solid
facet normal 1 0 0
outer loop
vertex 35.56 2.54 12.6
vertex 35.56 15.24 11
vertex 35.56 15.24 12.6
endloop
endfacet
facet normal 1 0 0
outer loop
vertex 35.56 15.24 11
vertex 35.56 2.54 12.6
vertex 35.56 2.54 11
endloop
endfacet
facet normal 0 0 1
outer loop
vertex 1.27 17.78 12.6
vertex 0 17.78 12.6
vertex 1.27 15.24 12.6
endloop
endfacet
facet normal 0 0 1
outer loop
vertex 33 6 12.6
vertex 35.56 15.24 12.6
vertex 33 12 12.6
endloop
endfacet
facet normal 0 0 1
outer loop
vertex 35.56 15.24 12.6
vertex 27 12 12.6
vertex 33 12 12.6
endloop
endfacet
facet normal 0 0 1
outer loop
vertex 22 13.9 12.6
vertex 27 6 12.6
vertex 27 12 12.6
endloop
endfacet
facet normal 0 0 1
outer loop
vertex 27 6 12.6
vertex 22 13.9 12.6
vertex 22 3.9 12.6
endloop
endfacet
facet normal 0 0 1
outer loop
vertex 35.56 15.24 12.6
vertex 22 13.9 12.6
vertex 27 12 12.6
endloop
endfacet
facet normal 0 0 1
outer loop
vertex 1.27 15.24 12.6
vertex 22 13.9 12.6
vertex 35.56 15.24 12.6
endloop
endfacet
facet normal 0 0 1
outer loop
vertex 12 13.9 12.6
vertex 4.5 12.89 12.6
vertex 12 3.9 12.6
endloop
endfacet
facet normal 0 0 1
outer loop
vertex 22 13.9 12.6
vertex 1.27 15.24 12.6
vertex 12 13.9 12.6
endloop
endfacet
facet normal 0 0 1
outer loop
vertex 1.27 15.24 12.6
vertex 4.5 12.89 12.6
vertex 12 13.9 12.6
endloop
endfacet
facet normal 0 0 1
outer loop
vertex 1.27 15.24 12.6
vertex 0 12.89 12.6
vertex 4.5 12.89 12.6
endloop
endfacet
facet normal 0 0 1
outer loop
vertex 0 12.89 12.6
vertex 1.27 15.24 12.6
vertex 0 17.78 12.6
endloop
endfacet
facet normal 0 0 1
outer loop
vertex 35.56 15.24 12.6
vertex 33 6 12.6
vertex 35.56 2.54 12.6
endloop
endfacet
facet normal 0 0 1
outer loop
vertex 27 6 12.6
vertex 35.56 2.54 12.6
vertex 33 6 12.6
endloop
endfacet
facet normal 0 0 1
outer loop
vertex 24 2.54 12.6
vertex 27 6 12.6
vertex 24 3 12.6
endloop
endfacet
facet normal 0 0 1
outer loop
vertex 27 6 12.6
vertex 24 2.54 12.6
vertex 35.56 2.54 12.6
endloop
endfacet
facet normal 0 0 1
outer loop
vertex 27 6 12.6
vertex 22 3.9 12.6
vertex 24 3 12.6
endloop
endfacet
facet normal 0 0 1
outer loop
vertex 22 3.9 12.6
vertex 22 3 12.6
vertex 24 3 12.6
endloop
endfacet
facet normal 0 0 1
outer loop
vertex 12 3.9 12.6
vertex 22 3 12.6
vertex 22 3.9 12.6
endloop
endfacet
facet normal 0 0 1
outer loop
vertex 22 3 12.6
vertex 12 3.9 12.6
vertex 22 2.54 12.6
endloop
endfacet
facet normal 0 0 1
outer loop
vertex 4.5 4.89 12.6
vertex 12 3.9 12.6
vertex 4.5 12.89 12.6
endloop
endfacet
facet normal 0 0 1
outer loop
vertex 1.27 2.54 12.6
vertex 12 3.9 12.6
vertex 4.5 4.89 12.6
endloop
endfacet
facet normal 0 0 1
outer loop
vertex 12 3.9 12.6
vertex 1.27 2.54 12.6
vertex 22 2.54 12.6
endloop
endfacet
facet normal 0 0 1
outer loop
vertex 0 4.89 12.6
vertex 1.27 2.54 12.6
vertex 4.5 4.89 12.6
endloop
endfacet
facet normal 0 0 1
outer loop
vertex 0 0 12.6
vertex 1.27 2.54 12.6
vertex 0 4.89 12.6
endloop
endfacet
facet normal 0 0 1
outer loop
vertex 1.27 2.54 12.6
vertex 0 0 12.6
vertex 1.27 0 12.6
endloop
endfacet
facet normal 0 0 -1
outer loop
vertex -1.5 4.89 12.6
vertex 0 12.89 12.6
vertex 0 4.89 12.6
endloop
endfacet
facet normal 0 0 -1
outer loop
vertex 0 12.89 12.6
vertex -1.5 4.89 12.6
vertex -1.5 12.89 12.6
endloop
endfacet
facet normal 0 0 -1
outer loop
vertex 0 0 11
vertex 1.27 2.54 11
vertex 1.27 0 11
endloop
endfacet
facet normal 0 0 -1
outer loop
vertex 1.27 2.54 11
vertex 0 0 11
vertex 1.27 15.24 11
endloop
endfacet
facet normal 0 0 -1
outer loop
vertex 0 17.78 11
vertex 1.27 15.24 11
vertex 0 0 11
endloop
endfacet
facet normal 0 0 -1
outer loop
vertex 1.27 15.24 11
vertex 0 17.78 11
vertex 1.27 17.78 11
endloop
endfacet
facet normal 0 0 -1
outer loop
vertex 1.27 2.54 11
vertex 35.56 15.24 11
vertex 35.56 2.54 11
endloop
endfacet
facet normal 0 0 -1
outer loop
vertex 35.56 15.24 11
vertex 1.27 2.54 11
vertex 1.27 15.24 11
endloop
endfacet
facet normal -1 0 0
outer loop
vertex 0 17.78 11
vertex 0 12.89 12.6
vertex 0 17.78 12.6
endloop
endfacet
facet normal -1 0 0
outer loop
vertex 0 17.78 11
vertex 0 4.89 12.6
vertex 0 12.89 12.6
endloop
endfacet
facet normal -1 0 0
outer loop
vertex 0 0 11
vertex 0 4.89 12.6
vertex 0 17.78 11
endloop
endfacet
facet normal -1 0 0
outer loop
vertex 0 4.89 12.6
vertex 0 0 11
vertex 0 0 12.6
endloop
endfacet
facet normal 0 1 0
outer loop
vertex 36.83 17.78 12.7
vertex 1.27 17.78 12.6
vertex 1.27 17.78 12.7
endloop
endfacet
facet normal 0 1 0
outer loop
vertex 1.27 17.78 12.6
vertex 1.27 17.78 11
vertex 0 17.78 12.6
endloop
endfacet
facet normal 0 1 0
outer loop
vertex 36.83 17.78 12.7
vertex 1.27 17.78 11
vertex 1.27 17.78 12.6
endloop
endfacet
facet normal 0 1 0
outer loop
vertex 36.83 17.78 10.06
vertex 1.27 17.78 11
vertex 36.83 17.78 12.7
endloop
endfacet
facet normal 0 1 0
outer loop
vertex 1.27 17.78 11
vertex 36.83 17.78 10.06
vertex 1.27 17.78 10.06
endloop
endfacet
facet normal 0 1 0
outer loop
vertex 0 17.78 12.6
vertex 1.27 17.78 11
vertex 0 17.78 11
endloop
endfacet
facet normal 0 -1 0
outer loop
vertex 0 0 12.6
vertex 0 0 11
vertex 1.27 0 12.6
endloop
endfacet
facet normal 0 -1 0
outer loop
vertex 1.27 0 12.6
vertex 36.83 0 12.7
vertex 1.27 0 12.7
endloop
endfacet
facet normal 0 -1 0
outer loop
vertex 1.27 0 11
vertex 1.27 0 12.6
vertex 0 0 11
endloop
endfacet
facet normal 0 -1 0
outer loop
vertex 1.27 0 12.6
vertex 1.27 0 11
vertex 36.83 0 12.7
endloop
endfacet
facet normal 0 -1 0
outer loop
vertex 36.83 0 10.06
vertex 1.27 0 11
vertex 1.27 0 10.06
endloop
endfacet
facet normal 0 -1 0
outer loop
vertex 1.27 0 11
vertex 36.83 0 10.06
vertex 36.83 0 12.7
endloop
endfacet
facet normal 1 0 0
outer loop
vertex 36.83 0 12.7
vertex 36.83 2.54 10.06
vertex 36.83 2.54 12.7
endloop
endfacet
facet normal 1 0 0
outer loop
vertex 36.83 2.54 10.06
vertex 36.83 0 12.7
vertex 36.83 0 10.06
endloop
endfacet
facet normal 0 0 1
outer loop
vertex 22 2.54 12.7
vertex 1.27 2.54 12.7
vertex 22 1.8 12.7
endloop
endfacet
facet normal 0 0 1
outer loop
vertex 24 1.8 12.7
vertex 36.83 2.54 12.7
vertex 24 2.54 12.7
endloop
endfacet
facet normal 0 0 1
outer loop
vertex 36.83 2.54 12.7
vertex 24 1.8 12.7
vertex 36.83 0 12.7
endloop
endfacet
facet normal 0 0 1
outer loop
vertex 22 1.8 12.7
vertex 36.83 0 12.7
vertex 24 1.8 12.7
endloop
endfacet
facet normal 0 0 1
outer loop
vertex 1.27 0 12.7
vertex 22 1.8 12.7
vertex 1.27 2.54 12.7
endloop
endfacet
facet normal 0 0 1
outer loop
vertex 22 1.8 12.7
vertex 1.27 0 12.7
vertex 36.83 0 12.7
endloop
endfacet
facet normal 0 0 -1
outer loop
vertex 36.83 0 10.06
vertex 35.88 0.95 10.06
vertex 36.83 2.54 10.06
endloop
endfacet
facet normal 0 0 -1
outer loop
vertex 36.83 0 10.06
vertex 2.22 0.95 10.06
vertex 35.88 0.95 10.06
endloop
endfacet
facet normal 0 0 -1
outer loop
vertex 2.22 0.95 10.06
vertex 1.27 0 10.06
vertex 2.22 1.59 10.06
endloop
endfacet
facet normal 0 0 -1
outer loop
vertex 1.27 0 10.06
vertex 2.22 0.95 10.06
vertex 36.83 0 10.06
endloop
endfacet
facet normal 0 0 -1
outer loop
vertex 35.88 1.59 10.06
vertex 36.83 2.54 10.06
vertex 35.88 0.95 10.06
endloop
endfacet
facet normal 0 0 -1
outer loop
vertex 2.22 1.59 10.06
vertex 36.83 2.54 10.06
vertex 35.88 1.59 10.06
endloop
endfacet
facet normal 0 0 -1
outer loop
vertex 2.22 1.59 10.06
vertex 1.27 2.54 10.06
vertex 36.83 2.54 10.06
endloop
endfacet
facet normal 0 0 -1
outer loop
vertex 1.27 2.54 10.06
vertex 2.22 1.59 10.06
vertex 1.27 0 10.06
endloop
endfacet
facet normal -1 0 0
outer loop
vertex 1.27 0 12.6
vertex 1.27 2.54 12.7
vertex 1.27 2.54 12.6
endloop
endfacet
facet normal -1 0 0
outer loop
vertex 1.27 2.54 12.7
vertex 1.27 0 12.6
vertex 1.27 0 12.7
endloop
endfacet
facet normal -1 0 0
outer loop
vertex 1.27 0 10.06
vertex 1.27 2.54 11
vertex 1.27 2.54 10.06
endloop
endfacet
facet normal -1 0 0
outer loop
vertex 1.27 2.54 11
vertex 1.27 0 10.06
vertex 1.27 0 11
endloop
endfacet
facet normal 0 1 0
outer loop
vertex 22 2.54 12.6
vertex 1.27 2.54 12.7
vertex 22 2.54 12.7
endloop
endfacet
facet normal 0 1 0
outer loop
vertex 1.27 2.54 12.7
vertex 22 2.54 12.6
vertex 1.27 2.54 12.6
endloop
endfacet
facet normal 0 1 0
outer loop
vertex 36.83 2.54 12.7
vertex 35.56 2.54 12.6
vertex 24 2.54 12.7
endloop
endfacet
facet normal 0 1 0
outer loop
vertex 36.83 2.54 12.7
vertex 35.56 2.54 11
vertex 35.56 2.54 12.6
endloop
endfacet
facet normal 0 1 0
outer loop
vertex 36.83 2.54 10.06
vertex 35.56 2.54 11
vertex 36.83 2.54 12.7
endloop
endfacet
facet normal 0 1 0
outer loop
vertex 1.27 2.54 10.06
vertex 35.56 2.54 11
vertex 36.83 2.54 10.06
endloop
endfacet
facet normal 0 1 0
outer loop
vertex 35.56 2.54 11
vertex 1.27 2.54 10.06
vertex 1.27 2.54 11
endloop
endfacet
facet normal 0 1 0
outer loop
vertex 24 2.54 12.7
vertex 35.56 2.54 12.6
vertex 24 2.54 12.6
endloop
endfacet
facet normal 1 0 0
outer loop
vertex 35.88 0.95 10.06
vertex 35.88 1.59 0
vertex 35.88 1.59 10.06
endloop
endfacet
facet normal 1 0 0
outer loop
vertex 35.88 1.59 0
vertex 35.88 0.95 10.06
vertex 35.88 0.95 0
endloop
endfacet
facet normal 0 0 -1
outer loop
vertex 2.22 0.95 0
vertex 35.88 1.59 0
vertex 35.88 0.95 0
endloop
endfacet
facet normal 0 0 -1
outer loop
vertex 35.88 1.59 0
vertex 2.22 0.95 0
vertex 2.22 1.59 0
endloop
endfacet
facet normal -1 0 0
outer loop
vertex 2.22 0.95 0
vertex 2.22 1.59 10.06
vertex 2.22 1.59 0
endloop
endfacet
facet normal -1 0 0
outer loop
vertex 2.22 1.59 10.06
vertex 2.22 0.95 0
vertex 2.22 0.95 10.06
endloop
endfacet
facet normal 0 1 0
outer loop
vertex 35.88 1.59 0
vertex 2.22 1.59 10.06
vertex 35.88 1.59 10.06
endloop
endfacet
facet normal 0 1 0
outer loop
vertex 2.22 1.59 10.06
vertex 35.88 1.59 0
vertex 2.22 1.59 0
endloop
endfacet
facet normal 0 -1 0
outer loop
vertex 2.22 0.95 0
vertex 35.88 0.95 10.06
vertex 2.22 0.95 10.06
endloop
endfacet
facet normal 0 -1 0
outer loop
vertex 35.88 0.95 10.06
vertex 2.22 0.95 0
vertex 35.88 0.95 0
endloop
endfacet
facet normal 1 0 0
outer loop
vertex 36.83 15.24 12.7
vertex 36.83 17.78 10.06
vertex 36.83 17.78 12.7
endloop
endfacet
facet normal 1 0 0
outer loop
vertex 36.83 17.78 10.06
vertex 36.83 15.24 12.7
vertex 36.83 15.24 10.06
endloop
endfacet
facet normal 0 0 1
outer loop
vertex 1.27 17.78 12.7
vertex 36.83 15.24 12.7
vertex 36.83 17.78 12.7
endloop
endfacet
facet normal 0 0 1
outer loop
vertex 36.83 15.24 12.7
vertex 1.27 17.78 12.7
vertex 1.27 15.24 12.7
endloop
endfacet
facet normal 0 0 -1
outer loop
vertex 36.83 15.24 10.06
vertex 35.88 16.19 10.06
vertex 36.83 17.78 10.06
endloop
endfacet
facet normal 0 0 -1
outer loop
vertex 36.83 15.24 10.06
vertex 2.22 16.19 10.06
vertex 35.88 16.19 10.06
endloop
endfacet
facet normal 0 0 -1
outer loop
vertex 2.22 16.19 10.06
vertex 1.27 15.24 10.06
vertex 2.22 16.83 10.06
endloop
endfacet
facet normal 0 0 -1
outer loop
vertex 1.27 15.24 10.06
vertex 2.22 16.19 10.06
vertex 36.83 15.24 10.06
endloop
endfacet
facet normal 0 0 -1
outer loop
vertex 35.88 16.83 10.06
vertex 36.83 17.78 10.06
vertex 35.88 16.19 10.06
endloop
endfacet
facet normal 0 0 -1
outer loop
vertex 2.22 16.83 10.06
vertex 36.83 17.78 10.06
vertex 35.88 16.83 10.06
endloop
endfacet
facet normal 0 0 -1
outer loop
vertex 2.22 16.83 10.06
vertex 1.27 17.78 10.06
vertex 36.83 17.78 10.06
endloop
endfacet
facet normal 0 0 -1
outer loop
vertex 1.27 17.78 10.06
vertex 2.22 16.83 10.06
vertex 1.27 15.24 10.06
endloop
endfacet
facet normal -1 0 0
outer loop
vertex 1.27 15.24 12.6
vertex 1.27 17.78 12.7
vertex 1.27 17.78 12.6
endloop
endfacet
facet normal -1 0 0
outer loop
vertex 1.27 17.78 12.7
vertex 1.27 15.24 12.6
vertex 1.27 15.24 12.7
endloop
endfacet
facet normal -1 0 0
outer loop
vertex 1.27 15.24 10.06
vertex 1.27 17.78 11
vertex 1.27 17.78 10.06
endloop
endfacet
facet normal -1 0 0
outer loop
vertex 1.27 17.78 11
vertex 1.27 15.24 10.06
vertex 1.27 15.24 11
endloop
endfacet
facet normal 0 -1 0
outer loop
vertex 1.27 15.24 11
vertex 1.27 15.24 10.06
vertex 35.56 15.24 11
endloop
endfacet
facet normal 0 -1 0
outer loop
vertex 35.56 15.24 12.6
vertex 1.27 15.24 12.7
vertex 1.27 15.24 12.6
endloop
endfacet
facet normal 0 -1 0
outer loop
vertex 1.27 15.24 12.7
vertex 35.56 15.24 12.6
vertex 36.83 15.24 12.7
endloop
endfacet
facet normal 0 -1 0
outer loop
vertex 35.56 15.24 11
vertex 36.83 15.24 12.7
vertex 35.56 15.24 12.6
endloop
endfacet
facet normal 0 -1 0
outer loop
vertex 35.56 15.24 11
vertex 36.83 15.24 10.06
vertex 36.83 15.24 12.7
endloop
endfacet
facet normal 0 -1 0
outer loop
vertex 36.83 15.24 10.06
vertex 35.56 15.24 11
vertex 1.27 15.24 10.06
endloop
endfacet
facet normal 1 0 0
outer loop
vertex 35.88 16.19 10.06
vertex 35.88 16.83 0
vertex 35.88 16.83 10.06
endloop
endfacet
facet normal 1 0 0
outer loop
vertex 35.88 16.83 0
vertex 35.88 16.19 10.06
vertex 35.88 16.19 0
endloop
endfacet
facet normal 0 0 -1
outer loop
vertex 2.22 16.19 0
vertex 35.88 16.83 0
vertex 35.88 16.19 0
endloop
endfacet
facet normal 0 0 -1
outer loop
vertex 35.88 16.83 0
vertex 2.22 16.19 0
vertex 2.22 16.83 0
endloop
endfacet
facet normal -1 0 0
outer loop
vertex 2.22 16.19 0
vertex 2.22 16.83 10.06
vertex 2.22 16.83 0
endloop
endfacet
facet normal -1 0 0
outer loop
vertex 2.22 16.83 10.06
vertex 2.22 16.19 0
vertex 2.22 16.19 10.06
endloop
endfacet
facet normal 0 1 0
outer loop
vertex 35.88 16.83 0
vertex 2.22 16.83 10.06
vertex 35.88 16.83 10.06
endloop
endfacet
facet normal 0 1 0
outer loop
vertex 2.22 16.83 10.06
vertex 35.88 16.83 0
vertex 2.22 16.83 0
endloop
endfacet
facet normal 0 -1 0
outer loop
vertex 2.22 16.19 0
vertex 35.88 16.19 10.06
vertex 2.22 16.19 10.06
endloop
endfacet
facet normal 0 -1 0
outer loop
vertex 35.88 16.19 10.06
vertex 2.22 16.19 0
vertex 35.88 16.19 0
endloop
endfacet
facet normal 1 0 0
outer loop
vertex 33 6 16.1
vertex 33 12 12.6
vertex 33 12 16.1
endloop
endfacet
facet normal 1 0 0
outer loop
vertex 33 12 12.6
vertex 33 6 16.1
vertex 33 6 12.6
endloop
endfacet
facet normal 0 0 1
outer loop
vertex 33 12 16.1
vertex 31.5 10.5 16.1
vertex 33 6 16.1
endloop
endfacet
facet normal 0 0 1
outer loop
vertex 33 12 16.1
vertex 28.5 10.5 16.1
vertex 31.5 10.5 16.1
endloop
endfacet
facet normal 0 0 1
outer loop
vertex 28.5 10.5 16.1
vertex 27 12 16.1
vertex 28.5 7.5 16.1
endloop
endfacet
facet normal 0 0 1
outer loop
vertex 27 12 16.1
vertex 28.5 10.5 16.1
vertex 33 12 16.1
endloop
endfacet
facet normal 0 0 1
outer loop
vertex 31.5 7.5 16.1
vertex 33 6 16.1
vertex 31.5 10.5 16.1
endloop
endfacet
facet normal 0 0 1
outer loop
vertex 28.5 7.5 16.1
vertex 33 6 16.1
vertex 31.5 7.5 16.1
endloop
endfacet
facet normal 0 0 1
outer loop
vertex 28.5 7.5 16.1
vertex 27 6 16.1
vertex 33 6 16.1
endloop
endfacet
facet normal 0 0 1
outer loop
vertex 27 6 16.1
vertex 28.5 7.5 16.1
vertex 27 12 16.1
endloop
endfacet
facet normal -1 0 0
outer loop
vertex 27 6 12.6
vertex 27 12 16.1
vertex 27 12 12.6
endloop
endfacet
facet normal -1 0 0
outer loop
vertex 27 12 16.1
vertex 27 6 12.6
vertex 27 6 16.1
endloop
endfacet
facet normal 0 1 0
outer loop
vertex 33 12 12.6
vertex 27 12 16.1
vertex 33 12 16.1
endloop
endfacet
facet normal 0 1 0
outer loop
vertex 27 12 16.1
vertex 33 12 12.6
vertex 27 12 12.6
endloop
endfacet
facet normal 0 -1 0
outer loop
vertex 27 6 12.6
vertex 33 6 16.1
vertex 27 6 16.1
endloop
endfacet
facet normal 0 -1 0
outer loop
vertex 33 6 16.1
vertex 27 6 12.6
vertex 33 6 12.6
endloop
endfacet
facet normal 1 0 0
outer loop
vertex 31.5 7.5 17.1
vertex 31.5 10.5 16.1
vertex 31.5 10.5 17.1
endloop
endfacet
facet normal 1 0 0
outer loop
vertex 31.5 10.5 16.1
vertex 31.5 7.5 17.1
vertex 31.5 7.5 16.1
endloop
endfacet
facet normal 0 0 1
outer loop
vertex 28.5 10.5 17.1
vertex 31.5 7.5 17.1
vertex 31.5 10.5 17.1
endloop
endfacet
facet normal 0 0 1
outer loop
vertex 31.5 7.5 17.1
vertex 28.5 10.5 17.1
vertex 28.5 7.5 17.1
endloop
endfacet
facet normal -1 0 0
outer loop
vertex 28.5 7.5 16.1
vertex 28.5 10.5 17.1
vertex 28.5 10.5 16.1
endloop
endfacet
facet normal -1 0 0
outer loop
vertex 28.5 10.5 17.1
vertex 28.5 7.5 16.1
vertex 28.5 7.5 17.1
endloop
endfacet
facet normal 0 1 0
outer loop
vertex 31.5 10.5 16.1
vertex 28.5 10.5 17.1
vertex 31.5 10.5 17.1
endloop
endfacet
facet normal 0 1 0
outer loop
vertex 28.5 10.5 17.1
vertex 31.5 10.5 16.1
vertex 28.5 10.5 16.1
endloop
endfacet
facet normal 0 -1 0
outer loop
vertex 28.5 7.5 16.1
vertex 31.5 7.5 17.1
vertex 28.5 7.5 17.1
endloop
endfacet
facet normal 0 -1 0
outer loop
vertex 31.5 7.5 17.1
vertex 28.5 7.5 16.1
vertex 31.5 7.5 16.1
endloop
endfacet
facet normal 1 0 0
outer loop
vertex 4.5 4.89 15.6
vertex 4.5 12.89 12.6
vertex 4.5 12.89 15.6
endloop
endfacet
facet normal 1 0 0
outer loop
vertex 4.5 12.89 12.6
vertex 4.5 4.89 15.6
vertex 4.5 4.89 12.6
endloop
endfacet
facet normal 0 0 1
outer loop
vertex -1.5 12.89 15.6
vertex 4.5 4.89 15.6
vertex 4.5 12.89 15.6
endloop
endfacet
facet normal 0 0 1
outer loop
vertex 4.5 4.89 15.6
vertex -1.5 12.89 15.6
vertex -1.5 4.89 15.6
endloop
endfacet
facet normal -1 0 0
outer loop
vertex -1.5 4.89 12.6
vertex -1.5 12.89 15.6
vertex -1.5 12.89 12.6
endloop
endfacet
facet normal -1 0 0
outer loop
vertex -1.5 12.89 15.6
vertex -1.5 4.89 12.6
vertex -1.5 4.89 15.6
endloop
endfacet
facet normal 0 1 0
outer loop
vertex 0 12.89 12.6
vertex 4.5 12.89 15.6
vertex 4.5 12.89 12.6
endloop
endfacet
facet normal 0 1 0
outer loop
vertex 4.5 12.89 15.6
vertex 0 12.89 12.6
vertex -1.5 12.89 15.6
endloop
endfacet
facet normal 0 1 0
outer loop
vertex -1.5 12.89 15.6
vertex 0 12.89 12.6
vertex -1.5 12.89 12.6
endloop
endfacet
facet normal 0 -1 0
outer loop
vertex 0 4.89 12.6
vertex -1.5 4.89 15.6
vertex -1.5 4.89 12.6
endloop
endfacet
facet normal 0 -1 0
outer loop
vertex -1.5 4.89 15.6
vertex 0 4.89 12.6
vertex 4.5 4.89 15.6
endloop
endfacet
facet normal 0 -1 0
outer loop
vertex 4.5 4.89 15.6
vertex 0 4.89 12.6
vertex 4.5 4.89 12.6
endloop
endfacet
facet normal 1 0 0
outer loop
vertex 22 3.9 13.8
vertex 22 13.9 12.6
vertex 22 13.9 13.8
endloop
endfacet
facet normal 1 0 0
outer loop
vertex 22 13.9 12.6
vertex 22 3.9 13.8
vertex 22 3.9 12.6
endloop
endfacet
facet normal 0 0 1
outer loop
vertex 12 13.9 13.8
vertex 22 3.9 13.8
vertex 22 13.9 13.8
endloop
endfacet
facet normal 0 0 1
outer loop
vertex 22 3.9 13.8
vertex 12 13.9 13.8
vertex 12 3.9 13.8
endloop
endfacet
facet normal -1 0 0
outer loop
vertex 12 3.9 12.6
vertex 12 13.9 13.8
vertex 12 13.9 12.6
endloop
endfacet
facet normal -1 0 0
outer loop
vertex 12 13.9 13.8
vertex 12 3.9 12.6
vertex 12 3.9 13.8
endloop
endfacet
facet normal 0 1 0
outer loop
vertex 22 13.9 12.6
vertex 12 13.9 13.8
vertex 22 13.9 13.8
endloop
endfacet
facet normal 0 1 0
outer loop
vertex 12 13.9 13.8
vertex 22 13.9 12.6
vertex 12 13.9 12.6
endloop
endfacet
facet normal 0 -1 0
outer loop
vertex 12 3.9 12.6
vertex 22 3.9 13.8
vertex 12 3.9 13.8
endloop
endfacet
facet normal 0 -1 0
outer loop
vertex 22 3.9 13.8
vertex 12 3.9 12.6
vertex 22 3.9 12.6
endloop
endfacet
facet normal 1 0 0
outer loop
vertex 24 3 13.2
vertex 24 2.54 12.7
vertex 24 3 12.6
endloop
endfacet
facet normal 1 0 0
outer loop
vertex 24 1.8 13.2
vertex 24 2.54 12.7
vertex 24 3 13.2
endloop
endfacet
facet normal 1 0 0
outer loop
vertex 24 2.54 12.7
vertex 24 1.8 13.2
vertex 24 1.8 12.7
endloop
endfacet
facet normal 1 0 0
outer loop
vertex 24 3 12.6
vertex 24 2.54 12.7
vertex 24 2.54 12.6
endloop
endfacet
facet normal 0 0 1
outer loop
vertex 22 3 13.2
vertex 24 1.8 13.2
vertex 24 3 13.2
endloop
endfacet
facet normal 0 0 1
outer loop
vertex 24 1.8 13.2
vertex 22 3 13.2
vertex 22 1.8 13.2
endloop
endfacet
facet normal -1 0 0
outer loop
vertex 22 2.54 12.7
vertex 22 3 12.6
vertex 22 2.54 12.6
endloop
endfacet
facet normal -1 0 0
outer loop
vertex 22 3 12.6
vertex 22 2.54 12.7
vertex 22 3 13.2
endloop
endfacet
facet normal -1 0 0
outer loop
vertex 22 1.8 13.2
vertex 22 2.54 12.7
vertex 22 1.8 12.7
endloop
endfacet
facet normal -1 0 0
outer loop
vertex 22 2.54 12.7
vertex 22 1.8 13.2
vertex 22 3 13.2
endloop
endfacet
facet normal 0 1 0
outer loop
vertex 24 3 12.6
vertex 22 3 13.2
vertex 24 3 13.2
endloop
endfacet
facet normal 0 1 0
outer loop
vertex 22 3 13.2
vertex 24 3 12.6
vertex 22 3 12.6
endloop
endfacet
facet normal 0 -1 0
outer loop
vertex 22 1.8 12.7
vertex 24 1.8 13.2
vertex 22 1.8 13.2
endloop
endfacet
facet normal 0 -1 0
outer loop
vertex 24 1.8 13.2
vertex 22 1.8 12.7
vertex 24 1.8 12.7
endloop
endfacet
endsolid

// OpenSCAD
// file: ../board_common.scad
// What every board model here is made of: a PCB with holes, pin headers,
// chips and jacks, drawn from published dimensions. Nothing here is anyone's
// mesh; a board's outline, hole positions and connector placements are
// specifications the makers publish so that cases and shields can be made.
//
// Every board's origin is its PCB's front-left bottom corner (x right, y back,
// z up), with the PCB lying flat on z = 0 -- so a board placed at a node in
// a site sits on that node's floor, which is where a board sits on a bench.

pcb_t = 1.6;
pitch = 2.54;

module pcb(size, holes = [], hole_d = 3.2, col = "darkgreen") {
    color(col) difference() {
        cube([size.x, size.y, pcb_t]);
        for (h = holes) translate([h.x, h.y, -1]) cylinder(d = hole_d, h = pcb_t + 2, $fn = 16);
    }
}

// Pins are square posts that overlap what they stand in. OpenSCAD 2021.01
// exports a union with hexagonal pins, or with parts that only touch along
// an edge, as a mesh that is not closed -- and then drops it from any later
// union, silently. Every part here overlaps its neighbour by a little.
pin = 0.64;

// a row of `n` pins at the given start, along +x (or +y when `along_y`), with plastic bodies
module header(n, at, along_y = false, rows = 1, h = 8.5) {
    translate([at.x, at.y, pcb_t - 0.1]) rotate([0, 0, along_y ? 90 : 0]) translate([0, along_y ? -rows * pitch : 0, 0]) {
        color("black") cube([n * pitch, rows * pitch, h]);
        color("gold") for (i = [0 : n - 1]) for (r = [0 : rows - 1])
            translate([i * pitch + pitch / 2 - pin / 2, r * pitch + pitch / 2 - pin / 2, -3]) cube([pin, pin, h + 6]);
    }
}

// a row of `n` bare pins pointing down (a devkit standing on a breadboard).
// The pins are one gold strip, not n posts: n posts through a plastic bar
// under a PCB is a face with n holes, which OpenSCAD 2021.01 exports as a
// mesh CGAL will not read back. At bench scale a strip is a row of pins.
module pins_down(n, at, along_y = false, len = 11) {
    // one translate per solid, from the board's own frame: a chain of
    // translates with negative offsets rounds differently and the exporter
    // then writes a mesh CGAL will not read back (seen; not understood)
    rotate([0, 0, along_y ? 90 : 0]) {
        color("black") translate([at.x, at.y - pitch / 2, pcb_t - pitch]) cube([n * pitch, pitch, pitch + 0.1]);
        color("gold") translate([at.x + pitch / 2 - pin / 2, at.y - pin / 2, -len]) cube([(n - 1) * pitch + pin, pin, len + pcb_t - pitch + 0.2]);
    }
}

module chip(size, at, col = "black") { color(col) translate([at.x, at.y, pcb_t - 0.1]) cube([size.x, size.y, size.z + 0.1]); }

module usb_b(at) {           // a full-size USB-B jack, its face at the -x side
    color("silver") translate([at.x, at.y, pcb_t]) cube([16, 12, 11]);
}
module barrel_jack(at) {     // a 2.1 mm DC jack, its face at the -x side
    color("black") translate([at.x, at.y, pcb_t]) cube([14, 9, 11]);
}
module micro_usb(at, along_y = false) {
    color("silver") translate([at.x, at.y, pcb_t]) cube(along_y ? [8, 6, 3] : [6, 8, 3]);
}
module usb_c(at) { color("silver") translate([at.x, at.y, pcb_t]) cube([9, 7.5, 3.2]); }
module usb_a_stack(at) {     // two USB-A ports one above the other, the face at +x
    color("silver") translate([at.x, at.y, pcb_t]) cube([17.5, 13.2, 16]);
}
module rj45(at) { color("silver") translate([at.x, at.y, pcb_t]) cube([21.5, 16, 13.5]); }
module button(at) { color("silver") translate([at.x, at.y, pcb_t - 0.1]) cube([6, 6, 3.6]); color("black") translate([at.x + 1.5, at.y + 1.5, pcb_t + 3.4]) cube([3, 3, 1.1]); }
module crystal(at) { color("silver") translate([at.x, at.y, pcb_t]) cube([11, 4.5, 3.5]); }
module heatsink(at, size = [9, 9, 8]) { color("black") translate([at.x, at.y, pcb_t - 0.1]) cube([size.x, size.y, size.z + 4.1]); }
module screw_terminal(n, at, along_y = false) {
    translate([at.x, at.y, pcb_t]) rotate([0, 0, along_y ? 90 : 0]) color("mediumblue") cube([n * 5.08, 8, 10]);
}
module jst(n, at, along_y = false) {   // a JST-XH style header
    translate([at.x, at.y, pcb_t]) rotate([0, 0, along_y ? 90 : 0]) color("ivory") cube([n * 2.5 + 2.4, 5.8, 7]);
}
module sd_slot(at) { color("silver") translate([at.x, at.y, pcb_t]) cube([26, 28, 3]); }
// main file
// Teensy 4.0, from the published card: a 35.56 x 17.78 mm PCB (1.4 x 0.7 in),
// fourteen pins down each long edge at 0.1 in pitch, the micro-USB jack on
// the left short edge, the i.MX RT1062 in the middle, the program button at
// the right. Drawn with its pins pointing down, as it stands on a breadboard.

include <../board_common.scad>

size = [35.56, 17.78];

module teensy_40() {
    pcb(size, col = "darkgreen");
    pins_down(14, [pitch / 2, 1.27]);
    pins_down(14, [pitch / 2, 17.78 - 1.27]);
    micro_usb([-1.5, 17.78 / 2 - 4]);
    chip([10, 10, 1.2], [12, 3.9]);
    button([27, 6]);
    chip([2, 1.2, 0.6], [22, 1.8], "orange");   // the LED
}

// standing on its pins, so the lowest point is the bench (z = 0)
translate([0, 0, 11]) teensy_40();
